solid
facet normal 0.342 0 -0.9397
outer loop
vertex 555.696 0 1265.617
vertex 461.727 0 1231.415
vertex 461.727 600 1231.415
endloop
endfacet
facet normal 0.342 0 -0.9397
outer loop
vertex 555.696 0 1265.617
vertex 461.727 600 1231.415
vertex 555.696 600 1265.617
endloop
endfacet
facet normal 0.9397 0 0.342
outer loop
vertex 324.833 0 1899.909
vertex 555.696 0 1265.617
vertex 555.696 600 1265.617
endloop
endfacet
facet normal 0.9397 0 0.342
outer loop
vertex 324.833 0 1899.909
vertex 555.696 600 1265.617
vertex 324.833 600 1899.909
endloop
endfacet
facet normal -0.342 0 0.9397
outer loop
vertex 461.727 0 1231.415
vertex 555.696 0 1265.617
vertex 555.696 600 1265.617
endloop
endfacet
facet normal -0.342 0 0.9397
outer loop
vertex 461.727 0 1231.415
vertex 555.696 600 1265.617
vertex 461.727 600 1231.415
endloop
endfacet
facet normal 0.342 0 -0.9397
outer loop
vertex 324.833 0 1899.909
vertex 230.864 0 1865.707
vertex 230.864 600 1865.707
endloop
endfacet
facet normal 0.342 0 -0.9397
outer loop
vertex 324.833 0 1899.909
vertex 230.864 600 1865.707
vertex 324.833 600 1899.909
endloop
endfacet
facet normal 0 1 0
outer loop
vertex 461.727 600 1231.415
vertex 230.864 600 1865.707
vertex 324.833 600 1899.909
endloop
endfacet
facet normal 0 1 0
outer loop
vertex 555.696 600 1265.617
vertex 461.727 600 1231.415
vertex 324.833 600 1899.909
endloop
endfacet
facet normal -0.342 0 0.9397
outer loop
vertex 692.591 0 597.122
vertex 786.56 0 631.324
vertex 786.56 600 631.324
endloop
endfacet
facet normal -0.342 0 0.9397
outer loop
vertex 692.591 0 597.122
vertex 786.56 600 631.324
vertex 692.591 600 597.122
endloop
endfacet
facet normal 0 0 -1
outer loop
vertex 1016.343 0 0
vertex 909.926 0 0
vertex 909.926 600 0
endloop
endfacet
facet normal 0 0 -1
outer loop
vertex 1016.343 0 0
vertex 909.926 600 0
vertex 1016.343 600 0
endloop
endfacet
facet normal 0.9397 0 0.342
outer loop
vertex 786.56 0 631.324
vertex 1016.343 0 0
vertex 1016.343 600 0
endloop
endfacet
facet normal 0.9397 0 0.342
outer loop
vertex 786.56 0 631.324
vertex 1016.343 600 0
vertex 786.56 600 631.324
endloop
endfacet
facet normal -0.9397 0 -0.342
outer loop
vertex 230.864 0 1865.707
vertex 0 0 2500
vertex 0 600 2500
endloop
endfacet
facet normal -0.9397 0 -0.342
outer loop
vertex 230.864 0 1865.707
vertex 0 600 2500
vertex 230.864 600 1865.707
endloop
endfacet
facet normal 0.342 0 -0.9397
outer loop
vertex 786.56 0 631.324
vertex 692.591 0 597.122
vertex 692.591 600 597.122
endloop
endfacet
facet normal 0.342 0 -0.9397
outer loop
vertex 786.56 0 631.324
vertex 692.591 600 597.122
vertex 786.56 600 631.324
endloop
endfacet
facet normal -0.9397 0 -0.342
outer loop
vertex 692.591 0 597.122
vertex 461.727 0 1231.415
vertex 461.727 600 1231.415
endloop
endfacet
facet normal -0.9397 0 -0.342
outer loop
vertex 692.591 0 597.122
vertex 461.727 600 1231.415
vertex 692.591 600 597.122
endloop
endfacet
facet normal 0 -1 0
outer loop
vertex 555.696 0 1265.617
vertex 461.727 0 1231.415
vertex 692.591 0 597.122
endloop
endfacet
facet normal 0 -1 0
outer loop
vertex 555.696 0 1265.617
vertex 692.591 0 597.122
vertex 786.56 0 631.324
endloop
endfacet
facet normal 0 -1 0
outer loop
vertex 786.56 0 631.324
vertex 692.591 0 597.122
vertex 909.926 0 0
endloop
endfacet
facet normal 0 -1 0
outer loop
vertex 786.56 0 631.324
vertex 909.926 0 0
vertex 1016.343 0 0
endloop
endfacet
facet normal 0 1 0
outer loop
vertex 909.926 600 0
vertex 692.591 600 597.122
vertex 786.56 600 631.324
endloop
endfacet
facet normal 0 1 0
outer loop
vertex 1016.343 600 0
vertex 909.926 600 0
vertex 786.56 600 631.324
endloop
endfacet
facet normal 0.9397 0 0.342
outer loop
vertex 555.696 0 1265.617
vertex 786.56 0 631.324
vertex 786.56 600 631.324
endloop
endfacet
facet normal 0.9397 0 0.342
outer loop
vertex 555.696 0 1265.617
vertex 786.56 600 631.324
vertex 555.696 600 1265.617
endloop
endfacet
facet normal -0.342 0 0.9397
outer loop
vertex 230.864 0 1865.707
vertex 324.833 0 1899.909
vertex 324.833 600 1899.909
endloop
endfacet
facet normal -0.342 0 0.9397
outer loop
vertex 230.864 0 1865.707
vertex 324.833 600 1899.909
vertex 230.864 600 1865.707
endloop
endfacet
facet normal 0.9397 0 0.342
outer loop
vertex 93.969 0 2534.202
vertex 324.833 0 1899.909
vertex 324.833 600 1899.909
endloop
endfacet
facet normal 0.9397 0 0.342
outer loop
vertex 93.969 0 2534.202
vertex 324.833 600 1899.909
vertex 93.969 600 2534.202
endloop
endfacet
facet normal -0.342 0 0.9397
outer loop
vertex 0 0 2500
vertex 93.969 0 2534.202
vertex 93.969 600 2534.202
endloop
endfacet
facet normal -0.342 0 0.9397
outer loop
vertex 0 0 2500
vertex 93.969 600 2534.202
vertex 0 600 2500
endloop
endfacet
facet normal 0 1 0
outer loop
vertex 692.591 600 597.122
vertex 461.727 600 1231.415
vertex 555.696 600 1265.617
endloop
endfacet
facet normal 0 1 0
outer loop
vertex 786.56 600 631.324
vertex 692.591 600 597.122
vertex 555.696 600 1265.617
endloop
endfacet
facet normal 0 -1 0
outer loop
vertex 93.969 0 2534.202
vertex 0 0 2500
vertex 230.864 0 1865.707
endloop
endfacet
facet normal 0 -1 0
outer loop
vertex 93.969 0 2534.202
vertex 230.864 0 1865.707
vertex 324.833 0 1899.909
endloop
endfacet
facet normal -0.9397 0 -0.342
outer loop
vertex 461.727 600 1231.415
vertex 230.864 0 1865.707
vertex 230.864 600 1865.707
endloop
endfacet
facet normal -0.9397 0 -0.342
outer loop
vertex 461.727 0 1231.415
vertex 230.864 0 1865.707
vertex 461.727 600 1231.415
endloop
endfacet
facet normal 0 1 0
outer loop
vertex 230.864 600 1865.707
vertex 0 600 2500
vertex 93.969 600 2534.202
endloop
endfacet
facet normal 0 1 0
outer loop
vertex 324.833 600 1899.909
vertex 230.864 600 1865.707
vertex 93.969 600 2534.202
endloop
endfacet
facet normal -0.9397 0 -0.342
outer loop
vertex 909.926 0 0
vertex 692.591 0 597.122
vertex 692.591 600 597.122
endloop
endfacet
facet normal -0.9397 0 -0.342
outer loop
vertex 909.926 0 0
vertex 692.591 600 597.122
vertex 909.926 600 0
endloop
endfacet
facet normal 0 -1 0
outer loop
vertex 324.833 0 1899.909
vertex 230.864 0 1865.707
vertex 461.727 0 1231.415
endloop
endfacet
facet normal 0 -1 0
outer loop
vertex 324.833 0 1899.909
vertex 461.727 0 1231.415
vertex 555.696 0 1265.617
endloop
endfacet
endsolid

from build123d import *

# Parameters (mm, degrees)
F1_DEPTH = 600
F2_DEPTH = 600


with BuildPart() as f1:
    # F0 (on Front) → F1 (new body)
    with BuildSketch(Plane.XZ):
        Polygon((93.969262, 2534.202014), (0, 2500), (230.863597, 1865.707481), (324.832859, 1899.909495), align=None)
        Polygon((555.696456, 1265.616976), (461.727193, 1231.414962), (692.59079, 597.122443), (786.560052, 631.324457), align=None)
    extrude(amount=-F1_DEPTH)


with BuildPart() as f2:
    # F0 (on Front) → F2 (new body)
    with BuildSketch(Plane.XZ):
        Polygon((324.832859, 1899.909495), (230.863597, 1865.707481), (461.727193, 1231.414962), (555.696456, 1265.616976), align=None)
        Polygon((786.560052, 631.324457), (692.59079, 597.122443), (909.925586, 0), (1016.343363, 0), align=None)
    extrude(amount=-F2_DEPTH)


solid = Compound([f1.part, f2.part])
